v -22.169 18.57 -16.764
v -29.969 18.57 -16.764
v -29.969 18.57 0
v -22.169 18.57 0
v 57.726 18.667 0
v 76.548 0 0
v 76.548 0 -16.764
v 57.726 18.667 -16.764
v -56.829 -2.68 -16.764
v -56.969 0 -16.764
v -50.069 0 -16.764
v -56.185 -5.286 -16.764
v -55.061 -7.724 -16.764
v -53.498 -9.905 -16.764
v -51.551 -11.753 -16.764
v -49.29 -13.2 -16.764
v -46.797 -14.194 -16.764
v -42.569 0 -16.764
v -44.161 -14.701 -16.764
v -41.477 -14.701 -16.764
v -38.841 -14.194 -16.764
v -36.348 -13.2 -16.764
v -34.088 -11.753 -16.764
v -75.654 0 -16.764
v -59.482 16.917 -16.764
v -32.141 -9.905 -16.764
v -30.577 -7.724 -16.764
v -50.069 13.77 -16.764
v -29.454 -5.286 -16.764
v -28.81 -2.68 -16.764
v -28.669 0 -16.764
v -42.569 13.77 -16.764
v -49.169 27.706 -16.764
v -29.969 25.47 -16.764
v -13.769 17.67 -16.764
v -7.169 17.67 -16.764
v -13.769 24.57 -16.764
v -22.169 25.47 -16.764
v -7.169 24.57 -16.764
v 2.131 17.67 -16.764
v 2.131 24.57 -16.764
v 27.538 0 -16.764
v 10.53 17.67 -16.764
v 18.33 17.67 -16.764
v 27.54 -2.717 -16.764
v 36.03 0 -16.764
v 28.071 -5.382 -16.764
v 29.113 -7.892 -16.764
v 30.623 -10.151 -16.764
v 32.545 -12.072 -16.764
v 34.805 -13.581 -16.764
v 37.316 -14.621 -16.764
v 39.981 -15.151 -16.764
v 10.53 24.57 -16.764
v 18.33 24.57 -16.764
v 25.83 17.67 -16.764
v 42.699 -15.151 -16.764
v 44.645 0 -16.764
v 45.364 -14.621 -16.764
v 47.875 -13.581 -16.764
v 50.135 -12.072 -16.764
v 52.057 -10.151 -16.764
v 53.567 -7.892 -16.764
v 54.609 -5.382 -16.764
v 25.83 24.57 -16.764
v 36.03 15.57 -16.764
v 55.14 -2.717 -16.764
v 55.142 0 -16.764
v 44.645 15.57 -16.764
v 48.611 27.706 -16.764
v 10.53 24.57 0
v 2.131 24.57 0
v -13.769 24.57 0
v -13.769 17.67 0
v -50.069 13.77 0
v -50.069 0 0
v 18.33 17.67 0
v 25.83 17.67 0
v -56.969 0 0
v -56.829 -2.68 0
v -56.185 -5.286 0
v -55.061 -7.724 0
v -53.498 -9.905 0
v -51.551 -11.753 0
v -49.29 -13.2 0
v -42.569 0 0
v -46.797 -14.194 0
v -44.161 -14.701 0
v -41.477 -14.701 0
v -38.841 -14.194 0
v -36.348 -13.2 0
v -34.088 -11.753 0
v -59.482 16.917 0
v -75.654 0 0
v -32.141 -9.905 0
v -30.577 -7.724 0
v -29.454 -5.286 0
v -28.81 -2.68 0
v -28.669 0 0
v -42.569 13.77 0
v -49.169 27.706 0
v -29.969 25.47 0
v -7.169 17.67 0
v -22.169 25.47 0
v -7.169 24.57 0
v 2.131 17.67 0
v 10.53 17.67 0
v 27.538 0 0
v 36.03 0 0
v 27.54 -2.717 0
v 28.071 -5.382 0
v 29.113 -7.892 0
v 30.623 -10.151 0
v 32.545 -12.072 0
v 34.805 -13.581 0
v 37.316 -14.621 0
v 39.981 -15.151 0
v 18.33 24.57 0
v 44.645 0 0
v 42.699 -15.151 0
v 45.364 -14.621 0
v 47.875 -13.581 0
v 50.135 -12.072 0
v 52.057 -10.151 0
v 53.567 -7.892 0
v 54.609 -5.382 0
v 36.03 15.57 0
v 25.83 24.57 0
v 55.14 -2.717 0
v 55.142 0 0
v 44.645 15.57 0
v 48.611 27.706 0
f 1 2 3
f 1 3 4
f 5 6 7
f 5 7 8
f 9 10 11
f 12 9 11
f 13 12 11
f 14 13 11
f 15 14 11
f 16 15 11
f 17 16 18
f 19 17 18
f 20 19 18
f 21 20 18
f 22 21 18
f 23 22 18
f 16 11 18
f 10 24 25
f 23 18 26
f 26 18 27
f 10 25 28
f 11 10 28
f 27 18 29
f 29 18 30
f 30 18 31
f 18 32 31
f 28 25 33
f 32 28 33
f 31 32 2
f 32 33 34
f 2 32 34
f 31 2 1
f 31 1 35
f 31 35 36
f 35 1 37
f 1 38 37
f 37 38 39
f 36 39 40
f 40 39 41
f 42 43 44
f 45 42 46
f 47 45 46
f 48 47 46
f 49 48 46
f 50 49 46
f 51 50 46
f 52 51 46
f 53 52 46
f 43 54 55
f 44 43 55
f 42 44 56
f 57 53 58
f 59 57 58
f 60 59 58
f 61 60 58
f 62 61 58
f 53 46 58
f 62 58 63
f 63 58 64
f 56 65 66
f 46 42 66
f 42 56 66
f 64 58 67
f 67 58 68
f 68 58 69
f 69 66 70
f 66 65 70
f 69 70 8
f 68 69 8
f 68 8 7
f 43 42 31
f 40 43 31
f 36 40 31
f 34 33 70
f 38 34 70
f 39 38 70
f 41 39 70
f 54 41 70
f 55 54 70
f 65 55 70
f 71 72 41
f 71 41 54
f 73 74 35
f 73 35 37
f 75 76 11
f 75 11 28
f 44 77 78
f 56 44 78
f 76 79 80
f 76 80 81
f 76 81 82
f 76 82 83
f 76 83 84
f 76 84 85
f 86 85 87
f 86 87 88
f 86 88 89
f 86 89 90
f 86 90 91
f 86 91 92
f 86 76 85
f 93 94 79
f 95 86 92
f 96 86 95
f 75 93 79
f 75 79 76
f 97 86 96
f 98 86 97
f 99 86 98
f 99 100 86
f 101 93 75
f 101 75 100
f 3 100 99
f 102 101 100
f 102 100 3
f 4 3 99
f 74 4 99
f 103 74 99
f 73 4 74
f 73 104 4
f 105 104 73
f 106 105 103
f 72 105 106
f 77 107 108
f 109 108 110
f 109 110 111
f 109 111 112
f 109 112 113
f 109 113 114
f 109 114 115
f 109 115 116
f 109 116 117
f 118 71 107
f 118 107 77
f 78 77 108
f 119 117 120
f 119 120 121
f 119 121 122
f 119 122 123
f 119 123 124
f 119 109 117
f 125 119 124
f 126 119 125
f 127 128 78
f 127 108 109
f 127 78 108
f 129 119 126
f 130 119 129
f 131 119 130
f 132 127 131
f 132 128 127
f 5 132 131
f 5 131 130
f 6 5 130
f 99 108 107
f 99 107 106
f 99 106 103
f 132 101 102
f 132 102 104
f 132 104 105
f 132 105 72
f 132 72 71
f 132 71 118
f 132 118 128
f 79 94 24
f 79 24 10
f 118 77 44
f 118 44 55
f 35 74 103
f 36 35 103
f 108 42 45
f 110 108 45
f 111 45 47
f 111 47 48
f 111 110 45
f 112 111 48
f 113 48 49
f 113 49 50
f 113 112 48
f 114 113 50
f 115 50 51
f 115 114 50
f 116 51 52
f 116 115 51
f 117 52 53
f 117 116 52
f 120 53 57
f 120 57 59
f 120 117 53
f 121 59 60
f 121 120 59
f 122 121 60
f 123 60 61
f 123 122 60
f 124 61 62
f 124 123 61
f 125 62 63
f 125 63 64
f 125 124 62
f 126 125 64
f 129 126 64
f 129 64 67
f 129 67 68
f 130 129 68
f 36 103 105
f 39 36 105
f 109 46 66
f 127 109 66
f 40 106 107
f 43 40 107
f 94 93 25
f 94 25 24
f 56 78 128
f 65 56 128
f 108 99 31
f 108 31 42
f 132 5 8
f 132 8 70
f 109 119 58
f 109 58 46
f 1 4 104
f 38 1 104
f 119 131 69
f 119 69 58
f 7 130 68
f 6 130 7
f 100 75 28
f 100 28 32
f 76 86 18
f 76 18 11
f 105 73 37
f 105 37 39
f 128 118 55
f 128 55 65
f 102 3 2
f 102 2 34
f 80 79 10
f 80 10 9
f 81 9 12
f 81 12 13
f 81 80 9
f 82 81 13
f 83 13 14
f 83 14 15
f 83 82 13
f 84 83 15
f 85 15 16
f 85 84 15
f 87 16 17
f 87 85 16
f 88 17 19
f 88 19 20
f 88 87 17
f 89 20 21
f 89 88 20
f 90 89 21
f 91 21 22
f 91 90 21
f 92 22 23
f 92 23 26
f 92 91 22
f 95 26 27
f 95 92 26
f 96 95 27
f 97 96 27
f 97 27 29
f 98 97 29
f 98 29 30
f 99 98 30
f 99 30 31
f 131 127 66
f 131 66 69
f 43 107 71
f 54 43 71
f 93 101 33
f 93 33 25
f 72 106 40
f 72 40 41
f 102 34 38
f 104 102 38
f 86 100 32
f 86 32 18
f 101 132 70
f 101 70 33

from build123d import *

# Parameters (mm, degrees)
F0_W     = 7.7999122441
F0_H     = 6.8999230862
F0_W_2   = 6.5999259241
F0_W_3   = 8.3999030758
F0_W_4   = 7.4999127537
F0_W_5   = 17.3998039681
F0_H_2   = 13.469719328
F0_W_6   = 19.7997752111
F1_DEPTH = 16.764


with BuildPart() as f1:
    # F0 (on Top) → F1 (new body)
    with BuildSketch(Plane.XY):
        with BuildLine():
            Line((-59.4818092616, 16.9173511698), (-75.65433532, 0))
            Line((-75.65433532, 0), (-56.9691322744, 0))
            Line((-56.9691322744, 0), (-50.0688962638, 0))
            Line((-50.0688962638, 0), (-50.0688962638, 13.7697160244))
            Line((-50.0688962638, 13.7697160244), (-42.5689779222, 13.7697160244))
            Line((-42.5689779222, 13.7697160244), (-42.5689779222, 0))
            Line((-42.5689779222, 0), (-30.2691180259, 0))
            Line((-30.2691180259, 0), (-30.2691180259, 13.469719328))
            Line((-30.2691180259, 13.469719328), (-14.36929591, 13.469719328))
            Line((-14.36929591, 13.469719328), (3.0305080581, 13.469719328))
            Line((3.0305080581, 13.469719328), (22.8302832693, 13.469719328))
            Line((22.8302832693, 13.469719328), (22.8302832693, 0))
            Line((22.8302832693, 0), (27.537882328, 0))
            Line((27.537882328, 0), (36.0301360488, 0))
            Line((36.0301360488, 0), (36.0301360488, 15.5696962029))
            Line((36.0301360488, 15.5696962029), (44.6445176616, 15.5696962029))
            Line((44.6445176616, 15.5696962029), (44.6445176616, 0))
            Line((44.6445176616, 0), (55.1420748234, 0))
            Line((55.1420748234, 0), (76.5484273434, 0))
            Line((76.5484273434, 0), (57.7259496837, 18.6665190633))
            ThreePointArc((57.7259496837, 18.6665190633), (44.6445176616, 18.7276304562), (35.1301468909, 27.7056228369))
            Line((35.1301468909, 27.7056228369), (-36.2690500915, 27.7056228369))
            ThreePointArc((-36.2690500915, 27.7056228369), (-46.0901653841, 18.4701942224), (-59.4818092616, 16.9173511698))
        make_face()
        with Locations((-26.0691642761, 22.0196228474)):
            Rectangle(F0_W, F0_H, mode=Mode.SUBTRACT)
        with Locations((-10.4693404865, 21.1196336895)):
            Rectangle(F0_W_2, F0_H, mode=Mode.SUBTRACT)
        with Locations((6.3304699725, 21.1196336895)):
            Rectangle(F0_W_3, F0_H, mode=Mode.SUBTRACT)
        with Locations((22.0802919939, 21.1196336895)):
            Rectangle(F0_W_4, F0_H, mode=Mode.SUBTRACT)
        with BuildLine():
            Line((-49.1685159504, 27.7056228369), (-59.4818092616, 16.9173511698))
            ThreePointArc((-59.4818092616, 16.9173511698), (-46.0901653841, 18.4701942224), (-36.2690500915, 27.7056228369))
            Line((-36.2690500915, 27.7056228369), (-49.1685159504, 27.7056228369))
        make_face()
        with BuildLine():
            Line((48.6113242805, 27.7056228369), (35.1301468909, 27.7056228369))
            ThreePointArc((35.1301468909, 27.7056228369), (44.6445176616, 18.7276304562), (57.7259496837, 18.6665190633))
            Line((57.7259496837, 18.6665190633), (48.6113242805, 27.7056228369))
        make_face()
        with Locations((-5.6693939259, 6.734859664)):
            Rectangle(F0_W_5, F0_H_2)
        with Locations((12.9303956637, 6.734859664)):
            Rectangle(F0_W_6, F0_H_2)
        Polygon((-30.2691180259, 0), (-28.6692157388, 0), (-14.36929591, 0), (-14.36929591, 13.469719328), (-30.2691180259, 13.469719328), align=None)
        with BuildLine():
            ThreePointArc((27.537882328, 0), (41.3399785757, -15.2172739199), (55.1420748234, 0))
            Line((55.1420748234, 0), (44.6445176616, 0))
            Line((44.6445176616, 0), (36.0301360488, 0))
            Line((36.0301360488, 0), (27.537882328, 0))
        make_face()
        with BuildLine():
            Line((-50.0688962638, 0), (-56.9691322744, 0))
            ThreePointArc((-56.9691322744, 0), (-42.8191740066, -14.7643966846), (-28.6692157388, 0))
            Line((-28.6692157388, 0), (-30.2691180259, 0))
            Line((-30.2691180259, 0), (-42.5689779222, 0))
            Line((-42.5689779222, 0), (-50.0688962638, 0))
        make_face()
    extrude(amount=-F1_DEPTH)


solid = f1.part
